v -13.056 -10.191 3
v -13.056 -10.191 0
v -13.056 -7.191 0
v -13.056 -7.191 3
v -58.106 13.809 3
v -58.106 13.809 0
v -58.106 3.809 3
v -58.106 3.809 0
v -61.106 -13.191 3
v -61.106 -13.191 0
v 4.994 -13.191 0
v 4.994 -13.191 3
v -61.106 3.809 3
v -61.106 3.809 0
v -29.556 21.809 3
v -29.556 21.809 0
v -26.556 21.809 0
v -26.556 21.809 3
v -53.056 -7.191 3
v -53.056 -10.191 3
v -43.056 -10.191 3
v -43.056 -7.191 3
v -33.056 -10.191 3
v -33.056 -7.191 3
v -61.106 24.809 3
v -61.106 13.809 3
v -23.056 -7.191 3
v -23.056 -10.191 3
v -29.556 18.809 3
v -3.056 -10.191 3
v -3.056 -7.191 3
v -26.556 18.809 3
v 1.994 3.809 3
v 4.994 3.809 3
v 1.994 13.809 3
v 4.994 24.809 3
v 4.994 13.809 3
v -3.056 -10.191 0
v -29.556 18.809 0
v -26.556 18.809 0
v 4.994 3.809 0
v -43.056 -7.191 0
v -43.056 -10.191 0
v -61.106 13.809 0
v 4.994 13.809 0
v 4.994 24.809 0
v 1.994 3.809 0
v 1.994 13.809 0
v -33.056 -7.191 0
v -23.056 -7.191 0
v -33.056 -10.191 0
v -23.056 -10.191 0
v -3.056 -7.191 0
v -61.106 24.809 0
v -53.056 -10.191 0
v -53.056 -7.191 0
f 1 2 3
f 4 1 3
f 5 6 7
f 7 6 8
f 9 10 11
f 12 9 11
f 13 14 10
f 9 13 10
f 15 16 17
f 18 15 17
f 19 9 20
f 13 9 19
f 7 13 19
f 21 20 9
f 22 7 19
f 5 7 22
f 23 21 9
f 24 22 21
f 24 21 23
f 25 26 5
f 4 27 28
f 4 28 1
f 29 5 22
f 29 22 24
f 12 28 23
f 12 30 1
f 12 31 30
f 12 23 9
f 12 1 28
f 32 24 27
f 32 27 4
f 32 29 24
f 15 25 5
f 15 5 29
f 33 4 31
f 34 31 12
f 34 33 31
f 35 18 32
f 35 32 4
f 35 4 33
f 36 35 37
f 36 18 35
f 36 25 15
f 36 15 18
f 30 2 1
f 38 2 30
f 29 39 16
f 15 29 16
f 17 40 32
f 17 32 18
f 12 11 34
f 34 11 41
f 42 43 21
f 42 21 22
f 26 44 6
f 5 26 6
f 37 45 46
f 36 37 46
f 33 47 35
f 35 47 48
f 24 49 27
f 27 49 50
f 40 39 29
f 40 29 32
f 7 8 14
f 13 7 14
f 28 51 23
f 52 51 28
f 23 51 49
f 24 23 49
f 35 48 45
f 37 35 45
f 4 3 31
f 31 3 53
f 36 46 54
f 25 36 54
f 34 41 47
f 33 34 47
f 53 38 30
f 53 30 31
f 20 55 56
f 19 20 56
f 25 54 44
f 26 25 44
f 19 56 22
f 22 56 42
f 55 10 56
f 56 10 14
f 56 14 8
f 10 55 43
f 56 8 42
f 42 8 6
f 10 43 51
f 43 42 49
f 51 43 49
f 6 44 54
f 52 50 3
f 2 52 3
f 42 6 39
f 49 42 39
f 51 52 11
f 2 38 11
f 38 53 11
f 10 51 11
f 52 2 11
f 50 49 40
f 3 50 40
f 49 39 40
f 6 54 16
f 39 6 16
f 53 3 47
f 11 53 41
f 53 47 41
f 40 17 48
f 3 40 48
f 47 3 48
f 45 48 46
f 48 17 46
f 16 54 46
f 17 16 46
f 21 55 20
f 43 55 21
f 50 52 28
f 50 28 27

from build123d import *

# Parameters (mm, degrees)
SKETCH1_W           = 10
SKETCH1_H           = 3
SKETCH1_W_2         = 3
BOSS_EXTRUDE1_DEPTH = 3


with BuildPart() as part:
    # Sketch1 → Boss-Extrude1 (new body)
    with BuildSketch(Plane.XY):
        Polygon((4.993890114, 24.809336695), (-61.106109886, 24.809336695), (-61.106109886, 13.809336695), (-58.106109886, 13.809336695), (-58.106109886, 3.809336695), (-61.106109886, 3.809336695), (-61.106109886, -13.190663305), (4.993890114, -13.190663305), (4.993890114, 3.809336695), (1.993890114, 3.809336695), (1.993890114, 13.809336695), (4.993890114, 13.809336695), align=None)
        with Locations((-28.056109886, -8.690663305)):
            Rectangle(SKETCH1_W, SKETCH1_H, mode=Mode.SUBTRACT)
        with Locations((-28.056109886, 20.309336695)):
            Rectangle(SKETCH1_W_2, SKETCH1_H, mode=Mode.SUBTRACT)
        with Locations((-8.056109886, -8.690663305)):
            Rectangle(SKETCH1_W, SKETCH1_H, mode=Mode.SUBTRACT)
        with Locations((-48.056109886, -8.690663305)):
            Rectangle(SKETCH1_W, SKETCH1_H, mode=Mode.SUBTRACT)
    extrude(amount=BOSS_EXTRUDE1_DEPTH)


solid = part.part
